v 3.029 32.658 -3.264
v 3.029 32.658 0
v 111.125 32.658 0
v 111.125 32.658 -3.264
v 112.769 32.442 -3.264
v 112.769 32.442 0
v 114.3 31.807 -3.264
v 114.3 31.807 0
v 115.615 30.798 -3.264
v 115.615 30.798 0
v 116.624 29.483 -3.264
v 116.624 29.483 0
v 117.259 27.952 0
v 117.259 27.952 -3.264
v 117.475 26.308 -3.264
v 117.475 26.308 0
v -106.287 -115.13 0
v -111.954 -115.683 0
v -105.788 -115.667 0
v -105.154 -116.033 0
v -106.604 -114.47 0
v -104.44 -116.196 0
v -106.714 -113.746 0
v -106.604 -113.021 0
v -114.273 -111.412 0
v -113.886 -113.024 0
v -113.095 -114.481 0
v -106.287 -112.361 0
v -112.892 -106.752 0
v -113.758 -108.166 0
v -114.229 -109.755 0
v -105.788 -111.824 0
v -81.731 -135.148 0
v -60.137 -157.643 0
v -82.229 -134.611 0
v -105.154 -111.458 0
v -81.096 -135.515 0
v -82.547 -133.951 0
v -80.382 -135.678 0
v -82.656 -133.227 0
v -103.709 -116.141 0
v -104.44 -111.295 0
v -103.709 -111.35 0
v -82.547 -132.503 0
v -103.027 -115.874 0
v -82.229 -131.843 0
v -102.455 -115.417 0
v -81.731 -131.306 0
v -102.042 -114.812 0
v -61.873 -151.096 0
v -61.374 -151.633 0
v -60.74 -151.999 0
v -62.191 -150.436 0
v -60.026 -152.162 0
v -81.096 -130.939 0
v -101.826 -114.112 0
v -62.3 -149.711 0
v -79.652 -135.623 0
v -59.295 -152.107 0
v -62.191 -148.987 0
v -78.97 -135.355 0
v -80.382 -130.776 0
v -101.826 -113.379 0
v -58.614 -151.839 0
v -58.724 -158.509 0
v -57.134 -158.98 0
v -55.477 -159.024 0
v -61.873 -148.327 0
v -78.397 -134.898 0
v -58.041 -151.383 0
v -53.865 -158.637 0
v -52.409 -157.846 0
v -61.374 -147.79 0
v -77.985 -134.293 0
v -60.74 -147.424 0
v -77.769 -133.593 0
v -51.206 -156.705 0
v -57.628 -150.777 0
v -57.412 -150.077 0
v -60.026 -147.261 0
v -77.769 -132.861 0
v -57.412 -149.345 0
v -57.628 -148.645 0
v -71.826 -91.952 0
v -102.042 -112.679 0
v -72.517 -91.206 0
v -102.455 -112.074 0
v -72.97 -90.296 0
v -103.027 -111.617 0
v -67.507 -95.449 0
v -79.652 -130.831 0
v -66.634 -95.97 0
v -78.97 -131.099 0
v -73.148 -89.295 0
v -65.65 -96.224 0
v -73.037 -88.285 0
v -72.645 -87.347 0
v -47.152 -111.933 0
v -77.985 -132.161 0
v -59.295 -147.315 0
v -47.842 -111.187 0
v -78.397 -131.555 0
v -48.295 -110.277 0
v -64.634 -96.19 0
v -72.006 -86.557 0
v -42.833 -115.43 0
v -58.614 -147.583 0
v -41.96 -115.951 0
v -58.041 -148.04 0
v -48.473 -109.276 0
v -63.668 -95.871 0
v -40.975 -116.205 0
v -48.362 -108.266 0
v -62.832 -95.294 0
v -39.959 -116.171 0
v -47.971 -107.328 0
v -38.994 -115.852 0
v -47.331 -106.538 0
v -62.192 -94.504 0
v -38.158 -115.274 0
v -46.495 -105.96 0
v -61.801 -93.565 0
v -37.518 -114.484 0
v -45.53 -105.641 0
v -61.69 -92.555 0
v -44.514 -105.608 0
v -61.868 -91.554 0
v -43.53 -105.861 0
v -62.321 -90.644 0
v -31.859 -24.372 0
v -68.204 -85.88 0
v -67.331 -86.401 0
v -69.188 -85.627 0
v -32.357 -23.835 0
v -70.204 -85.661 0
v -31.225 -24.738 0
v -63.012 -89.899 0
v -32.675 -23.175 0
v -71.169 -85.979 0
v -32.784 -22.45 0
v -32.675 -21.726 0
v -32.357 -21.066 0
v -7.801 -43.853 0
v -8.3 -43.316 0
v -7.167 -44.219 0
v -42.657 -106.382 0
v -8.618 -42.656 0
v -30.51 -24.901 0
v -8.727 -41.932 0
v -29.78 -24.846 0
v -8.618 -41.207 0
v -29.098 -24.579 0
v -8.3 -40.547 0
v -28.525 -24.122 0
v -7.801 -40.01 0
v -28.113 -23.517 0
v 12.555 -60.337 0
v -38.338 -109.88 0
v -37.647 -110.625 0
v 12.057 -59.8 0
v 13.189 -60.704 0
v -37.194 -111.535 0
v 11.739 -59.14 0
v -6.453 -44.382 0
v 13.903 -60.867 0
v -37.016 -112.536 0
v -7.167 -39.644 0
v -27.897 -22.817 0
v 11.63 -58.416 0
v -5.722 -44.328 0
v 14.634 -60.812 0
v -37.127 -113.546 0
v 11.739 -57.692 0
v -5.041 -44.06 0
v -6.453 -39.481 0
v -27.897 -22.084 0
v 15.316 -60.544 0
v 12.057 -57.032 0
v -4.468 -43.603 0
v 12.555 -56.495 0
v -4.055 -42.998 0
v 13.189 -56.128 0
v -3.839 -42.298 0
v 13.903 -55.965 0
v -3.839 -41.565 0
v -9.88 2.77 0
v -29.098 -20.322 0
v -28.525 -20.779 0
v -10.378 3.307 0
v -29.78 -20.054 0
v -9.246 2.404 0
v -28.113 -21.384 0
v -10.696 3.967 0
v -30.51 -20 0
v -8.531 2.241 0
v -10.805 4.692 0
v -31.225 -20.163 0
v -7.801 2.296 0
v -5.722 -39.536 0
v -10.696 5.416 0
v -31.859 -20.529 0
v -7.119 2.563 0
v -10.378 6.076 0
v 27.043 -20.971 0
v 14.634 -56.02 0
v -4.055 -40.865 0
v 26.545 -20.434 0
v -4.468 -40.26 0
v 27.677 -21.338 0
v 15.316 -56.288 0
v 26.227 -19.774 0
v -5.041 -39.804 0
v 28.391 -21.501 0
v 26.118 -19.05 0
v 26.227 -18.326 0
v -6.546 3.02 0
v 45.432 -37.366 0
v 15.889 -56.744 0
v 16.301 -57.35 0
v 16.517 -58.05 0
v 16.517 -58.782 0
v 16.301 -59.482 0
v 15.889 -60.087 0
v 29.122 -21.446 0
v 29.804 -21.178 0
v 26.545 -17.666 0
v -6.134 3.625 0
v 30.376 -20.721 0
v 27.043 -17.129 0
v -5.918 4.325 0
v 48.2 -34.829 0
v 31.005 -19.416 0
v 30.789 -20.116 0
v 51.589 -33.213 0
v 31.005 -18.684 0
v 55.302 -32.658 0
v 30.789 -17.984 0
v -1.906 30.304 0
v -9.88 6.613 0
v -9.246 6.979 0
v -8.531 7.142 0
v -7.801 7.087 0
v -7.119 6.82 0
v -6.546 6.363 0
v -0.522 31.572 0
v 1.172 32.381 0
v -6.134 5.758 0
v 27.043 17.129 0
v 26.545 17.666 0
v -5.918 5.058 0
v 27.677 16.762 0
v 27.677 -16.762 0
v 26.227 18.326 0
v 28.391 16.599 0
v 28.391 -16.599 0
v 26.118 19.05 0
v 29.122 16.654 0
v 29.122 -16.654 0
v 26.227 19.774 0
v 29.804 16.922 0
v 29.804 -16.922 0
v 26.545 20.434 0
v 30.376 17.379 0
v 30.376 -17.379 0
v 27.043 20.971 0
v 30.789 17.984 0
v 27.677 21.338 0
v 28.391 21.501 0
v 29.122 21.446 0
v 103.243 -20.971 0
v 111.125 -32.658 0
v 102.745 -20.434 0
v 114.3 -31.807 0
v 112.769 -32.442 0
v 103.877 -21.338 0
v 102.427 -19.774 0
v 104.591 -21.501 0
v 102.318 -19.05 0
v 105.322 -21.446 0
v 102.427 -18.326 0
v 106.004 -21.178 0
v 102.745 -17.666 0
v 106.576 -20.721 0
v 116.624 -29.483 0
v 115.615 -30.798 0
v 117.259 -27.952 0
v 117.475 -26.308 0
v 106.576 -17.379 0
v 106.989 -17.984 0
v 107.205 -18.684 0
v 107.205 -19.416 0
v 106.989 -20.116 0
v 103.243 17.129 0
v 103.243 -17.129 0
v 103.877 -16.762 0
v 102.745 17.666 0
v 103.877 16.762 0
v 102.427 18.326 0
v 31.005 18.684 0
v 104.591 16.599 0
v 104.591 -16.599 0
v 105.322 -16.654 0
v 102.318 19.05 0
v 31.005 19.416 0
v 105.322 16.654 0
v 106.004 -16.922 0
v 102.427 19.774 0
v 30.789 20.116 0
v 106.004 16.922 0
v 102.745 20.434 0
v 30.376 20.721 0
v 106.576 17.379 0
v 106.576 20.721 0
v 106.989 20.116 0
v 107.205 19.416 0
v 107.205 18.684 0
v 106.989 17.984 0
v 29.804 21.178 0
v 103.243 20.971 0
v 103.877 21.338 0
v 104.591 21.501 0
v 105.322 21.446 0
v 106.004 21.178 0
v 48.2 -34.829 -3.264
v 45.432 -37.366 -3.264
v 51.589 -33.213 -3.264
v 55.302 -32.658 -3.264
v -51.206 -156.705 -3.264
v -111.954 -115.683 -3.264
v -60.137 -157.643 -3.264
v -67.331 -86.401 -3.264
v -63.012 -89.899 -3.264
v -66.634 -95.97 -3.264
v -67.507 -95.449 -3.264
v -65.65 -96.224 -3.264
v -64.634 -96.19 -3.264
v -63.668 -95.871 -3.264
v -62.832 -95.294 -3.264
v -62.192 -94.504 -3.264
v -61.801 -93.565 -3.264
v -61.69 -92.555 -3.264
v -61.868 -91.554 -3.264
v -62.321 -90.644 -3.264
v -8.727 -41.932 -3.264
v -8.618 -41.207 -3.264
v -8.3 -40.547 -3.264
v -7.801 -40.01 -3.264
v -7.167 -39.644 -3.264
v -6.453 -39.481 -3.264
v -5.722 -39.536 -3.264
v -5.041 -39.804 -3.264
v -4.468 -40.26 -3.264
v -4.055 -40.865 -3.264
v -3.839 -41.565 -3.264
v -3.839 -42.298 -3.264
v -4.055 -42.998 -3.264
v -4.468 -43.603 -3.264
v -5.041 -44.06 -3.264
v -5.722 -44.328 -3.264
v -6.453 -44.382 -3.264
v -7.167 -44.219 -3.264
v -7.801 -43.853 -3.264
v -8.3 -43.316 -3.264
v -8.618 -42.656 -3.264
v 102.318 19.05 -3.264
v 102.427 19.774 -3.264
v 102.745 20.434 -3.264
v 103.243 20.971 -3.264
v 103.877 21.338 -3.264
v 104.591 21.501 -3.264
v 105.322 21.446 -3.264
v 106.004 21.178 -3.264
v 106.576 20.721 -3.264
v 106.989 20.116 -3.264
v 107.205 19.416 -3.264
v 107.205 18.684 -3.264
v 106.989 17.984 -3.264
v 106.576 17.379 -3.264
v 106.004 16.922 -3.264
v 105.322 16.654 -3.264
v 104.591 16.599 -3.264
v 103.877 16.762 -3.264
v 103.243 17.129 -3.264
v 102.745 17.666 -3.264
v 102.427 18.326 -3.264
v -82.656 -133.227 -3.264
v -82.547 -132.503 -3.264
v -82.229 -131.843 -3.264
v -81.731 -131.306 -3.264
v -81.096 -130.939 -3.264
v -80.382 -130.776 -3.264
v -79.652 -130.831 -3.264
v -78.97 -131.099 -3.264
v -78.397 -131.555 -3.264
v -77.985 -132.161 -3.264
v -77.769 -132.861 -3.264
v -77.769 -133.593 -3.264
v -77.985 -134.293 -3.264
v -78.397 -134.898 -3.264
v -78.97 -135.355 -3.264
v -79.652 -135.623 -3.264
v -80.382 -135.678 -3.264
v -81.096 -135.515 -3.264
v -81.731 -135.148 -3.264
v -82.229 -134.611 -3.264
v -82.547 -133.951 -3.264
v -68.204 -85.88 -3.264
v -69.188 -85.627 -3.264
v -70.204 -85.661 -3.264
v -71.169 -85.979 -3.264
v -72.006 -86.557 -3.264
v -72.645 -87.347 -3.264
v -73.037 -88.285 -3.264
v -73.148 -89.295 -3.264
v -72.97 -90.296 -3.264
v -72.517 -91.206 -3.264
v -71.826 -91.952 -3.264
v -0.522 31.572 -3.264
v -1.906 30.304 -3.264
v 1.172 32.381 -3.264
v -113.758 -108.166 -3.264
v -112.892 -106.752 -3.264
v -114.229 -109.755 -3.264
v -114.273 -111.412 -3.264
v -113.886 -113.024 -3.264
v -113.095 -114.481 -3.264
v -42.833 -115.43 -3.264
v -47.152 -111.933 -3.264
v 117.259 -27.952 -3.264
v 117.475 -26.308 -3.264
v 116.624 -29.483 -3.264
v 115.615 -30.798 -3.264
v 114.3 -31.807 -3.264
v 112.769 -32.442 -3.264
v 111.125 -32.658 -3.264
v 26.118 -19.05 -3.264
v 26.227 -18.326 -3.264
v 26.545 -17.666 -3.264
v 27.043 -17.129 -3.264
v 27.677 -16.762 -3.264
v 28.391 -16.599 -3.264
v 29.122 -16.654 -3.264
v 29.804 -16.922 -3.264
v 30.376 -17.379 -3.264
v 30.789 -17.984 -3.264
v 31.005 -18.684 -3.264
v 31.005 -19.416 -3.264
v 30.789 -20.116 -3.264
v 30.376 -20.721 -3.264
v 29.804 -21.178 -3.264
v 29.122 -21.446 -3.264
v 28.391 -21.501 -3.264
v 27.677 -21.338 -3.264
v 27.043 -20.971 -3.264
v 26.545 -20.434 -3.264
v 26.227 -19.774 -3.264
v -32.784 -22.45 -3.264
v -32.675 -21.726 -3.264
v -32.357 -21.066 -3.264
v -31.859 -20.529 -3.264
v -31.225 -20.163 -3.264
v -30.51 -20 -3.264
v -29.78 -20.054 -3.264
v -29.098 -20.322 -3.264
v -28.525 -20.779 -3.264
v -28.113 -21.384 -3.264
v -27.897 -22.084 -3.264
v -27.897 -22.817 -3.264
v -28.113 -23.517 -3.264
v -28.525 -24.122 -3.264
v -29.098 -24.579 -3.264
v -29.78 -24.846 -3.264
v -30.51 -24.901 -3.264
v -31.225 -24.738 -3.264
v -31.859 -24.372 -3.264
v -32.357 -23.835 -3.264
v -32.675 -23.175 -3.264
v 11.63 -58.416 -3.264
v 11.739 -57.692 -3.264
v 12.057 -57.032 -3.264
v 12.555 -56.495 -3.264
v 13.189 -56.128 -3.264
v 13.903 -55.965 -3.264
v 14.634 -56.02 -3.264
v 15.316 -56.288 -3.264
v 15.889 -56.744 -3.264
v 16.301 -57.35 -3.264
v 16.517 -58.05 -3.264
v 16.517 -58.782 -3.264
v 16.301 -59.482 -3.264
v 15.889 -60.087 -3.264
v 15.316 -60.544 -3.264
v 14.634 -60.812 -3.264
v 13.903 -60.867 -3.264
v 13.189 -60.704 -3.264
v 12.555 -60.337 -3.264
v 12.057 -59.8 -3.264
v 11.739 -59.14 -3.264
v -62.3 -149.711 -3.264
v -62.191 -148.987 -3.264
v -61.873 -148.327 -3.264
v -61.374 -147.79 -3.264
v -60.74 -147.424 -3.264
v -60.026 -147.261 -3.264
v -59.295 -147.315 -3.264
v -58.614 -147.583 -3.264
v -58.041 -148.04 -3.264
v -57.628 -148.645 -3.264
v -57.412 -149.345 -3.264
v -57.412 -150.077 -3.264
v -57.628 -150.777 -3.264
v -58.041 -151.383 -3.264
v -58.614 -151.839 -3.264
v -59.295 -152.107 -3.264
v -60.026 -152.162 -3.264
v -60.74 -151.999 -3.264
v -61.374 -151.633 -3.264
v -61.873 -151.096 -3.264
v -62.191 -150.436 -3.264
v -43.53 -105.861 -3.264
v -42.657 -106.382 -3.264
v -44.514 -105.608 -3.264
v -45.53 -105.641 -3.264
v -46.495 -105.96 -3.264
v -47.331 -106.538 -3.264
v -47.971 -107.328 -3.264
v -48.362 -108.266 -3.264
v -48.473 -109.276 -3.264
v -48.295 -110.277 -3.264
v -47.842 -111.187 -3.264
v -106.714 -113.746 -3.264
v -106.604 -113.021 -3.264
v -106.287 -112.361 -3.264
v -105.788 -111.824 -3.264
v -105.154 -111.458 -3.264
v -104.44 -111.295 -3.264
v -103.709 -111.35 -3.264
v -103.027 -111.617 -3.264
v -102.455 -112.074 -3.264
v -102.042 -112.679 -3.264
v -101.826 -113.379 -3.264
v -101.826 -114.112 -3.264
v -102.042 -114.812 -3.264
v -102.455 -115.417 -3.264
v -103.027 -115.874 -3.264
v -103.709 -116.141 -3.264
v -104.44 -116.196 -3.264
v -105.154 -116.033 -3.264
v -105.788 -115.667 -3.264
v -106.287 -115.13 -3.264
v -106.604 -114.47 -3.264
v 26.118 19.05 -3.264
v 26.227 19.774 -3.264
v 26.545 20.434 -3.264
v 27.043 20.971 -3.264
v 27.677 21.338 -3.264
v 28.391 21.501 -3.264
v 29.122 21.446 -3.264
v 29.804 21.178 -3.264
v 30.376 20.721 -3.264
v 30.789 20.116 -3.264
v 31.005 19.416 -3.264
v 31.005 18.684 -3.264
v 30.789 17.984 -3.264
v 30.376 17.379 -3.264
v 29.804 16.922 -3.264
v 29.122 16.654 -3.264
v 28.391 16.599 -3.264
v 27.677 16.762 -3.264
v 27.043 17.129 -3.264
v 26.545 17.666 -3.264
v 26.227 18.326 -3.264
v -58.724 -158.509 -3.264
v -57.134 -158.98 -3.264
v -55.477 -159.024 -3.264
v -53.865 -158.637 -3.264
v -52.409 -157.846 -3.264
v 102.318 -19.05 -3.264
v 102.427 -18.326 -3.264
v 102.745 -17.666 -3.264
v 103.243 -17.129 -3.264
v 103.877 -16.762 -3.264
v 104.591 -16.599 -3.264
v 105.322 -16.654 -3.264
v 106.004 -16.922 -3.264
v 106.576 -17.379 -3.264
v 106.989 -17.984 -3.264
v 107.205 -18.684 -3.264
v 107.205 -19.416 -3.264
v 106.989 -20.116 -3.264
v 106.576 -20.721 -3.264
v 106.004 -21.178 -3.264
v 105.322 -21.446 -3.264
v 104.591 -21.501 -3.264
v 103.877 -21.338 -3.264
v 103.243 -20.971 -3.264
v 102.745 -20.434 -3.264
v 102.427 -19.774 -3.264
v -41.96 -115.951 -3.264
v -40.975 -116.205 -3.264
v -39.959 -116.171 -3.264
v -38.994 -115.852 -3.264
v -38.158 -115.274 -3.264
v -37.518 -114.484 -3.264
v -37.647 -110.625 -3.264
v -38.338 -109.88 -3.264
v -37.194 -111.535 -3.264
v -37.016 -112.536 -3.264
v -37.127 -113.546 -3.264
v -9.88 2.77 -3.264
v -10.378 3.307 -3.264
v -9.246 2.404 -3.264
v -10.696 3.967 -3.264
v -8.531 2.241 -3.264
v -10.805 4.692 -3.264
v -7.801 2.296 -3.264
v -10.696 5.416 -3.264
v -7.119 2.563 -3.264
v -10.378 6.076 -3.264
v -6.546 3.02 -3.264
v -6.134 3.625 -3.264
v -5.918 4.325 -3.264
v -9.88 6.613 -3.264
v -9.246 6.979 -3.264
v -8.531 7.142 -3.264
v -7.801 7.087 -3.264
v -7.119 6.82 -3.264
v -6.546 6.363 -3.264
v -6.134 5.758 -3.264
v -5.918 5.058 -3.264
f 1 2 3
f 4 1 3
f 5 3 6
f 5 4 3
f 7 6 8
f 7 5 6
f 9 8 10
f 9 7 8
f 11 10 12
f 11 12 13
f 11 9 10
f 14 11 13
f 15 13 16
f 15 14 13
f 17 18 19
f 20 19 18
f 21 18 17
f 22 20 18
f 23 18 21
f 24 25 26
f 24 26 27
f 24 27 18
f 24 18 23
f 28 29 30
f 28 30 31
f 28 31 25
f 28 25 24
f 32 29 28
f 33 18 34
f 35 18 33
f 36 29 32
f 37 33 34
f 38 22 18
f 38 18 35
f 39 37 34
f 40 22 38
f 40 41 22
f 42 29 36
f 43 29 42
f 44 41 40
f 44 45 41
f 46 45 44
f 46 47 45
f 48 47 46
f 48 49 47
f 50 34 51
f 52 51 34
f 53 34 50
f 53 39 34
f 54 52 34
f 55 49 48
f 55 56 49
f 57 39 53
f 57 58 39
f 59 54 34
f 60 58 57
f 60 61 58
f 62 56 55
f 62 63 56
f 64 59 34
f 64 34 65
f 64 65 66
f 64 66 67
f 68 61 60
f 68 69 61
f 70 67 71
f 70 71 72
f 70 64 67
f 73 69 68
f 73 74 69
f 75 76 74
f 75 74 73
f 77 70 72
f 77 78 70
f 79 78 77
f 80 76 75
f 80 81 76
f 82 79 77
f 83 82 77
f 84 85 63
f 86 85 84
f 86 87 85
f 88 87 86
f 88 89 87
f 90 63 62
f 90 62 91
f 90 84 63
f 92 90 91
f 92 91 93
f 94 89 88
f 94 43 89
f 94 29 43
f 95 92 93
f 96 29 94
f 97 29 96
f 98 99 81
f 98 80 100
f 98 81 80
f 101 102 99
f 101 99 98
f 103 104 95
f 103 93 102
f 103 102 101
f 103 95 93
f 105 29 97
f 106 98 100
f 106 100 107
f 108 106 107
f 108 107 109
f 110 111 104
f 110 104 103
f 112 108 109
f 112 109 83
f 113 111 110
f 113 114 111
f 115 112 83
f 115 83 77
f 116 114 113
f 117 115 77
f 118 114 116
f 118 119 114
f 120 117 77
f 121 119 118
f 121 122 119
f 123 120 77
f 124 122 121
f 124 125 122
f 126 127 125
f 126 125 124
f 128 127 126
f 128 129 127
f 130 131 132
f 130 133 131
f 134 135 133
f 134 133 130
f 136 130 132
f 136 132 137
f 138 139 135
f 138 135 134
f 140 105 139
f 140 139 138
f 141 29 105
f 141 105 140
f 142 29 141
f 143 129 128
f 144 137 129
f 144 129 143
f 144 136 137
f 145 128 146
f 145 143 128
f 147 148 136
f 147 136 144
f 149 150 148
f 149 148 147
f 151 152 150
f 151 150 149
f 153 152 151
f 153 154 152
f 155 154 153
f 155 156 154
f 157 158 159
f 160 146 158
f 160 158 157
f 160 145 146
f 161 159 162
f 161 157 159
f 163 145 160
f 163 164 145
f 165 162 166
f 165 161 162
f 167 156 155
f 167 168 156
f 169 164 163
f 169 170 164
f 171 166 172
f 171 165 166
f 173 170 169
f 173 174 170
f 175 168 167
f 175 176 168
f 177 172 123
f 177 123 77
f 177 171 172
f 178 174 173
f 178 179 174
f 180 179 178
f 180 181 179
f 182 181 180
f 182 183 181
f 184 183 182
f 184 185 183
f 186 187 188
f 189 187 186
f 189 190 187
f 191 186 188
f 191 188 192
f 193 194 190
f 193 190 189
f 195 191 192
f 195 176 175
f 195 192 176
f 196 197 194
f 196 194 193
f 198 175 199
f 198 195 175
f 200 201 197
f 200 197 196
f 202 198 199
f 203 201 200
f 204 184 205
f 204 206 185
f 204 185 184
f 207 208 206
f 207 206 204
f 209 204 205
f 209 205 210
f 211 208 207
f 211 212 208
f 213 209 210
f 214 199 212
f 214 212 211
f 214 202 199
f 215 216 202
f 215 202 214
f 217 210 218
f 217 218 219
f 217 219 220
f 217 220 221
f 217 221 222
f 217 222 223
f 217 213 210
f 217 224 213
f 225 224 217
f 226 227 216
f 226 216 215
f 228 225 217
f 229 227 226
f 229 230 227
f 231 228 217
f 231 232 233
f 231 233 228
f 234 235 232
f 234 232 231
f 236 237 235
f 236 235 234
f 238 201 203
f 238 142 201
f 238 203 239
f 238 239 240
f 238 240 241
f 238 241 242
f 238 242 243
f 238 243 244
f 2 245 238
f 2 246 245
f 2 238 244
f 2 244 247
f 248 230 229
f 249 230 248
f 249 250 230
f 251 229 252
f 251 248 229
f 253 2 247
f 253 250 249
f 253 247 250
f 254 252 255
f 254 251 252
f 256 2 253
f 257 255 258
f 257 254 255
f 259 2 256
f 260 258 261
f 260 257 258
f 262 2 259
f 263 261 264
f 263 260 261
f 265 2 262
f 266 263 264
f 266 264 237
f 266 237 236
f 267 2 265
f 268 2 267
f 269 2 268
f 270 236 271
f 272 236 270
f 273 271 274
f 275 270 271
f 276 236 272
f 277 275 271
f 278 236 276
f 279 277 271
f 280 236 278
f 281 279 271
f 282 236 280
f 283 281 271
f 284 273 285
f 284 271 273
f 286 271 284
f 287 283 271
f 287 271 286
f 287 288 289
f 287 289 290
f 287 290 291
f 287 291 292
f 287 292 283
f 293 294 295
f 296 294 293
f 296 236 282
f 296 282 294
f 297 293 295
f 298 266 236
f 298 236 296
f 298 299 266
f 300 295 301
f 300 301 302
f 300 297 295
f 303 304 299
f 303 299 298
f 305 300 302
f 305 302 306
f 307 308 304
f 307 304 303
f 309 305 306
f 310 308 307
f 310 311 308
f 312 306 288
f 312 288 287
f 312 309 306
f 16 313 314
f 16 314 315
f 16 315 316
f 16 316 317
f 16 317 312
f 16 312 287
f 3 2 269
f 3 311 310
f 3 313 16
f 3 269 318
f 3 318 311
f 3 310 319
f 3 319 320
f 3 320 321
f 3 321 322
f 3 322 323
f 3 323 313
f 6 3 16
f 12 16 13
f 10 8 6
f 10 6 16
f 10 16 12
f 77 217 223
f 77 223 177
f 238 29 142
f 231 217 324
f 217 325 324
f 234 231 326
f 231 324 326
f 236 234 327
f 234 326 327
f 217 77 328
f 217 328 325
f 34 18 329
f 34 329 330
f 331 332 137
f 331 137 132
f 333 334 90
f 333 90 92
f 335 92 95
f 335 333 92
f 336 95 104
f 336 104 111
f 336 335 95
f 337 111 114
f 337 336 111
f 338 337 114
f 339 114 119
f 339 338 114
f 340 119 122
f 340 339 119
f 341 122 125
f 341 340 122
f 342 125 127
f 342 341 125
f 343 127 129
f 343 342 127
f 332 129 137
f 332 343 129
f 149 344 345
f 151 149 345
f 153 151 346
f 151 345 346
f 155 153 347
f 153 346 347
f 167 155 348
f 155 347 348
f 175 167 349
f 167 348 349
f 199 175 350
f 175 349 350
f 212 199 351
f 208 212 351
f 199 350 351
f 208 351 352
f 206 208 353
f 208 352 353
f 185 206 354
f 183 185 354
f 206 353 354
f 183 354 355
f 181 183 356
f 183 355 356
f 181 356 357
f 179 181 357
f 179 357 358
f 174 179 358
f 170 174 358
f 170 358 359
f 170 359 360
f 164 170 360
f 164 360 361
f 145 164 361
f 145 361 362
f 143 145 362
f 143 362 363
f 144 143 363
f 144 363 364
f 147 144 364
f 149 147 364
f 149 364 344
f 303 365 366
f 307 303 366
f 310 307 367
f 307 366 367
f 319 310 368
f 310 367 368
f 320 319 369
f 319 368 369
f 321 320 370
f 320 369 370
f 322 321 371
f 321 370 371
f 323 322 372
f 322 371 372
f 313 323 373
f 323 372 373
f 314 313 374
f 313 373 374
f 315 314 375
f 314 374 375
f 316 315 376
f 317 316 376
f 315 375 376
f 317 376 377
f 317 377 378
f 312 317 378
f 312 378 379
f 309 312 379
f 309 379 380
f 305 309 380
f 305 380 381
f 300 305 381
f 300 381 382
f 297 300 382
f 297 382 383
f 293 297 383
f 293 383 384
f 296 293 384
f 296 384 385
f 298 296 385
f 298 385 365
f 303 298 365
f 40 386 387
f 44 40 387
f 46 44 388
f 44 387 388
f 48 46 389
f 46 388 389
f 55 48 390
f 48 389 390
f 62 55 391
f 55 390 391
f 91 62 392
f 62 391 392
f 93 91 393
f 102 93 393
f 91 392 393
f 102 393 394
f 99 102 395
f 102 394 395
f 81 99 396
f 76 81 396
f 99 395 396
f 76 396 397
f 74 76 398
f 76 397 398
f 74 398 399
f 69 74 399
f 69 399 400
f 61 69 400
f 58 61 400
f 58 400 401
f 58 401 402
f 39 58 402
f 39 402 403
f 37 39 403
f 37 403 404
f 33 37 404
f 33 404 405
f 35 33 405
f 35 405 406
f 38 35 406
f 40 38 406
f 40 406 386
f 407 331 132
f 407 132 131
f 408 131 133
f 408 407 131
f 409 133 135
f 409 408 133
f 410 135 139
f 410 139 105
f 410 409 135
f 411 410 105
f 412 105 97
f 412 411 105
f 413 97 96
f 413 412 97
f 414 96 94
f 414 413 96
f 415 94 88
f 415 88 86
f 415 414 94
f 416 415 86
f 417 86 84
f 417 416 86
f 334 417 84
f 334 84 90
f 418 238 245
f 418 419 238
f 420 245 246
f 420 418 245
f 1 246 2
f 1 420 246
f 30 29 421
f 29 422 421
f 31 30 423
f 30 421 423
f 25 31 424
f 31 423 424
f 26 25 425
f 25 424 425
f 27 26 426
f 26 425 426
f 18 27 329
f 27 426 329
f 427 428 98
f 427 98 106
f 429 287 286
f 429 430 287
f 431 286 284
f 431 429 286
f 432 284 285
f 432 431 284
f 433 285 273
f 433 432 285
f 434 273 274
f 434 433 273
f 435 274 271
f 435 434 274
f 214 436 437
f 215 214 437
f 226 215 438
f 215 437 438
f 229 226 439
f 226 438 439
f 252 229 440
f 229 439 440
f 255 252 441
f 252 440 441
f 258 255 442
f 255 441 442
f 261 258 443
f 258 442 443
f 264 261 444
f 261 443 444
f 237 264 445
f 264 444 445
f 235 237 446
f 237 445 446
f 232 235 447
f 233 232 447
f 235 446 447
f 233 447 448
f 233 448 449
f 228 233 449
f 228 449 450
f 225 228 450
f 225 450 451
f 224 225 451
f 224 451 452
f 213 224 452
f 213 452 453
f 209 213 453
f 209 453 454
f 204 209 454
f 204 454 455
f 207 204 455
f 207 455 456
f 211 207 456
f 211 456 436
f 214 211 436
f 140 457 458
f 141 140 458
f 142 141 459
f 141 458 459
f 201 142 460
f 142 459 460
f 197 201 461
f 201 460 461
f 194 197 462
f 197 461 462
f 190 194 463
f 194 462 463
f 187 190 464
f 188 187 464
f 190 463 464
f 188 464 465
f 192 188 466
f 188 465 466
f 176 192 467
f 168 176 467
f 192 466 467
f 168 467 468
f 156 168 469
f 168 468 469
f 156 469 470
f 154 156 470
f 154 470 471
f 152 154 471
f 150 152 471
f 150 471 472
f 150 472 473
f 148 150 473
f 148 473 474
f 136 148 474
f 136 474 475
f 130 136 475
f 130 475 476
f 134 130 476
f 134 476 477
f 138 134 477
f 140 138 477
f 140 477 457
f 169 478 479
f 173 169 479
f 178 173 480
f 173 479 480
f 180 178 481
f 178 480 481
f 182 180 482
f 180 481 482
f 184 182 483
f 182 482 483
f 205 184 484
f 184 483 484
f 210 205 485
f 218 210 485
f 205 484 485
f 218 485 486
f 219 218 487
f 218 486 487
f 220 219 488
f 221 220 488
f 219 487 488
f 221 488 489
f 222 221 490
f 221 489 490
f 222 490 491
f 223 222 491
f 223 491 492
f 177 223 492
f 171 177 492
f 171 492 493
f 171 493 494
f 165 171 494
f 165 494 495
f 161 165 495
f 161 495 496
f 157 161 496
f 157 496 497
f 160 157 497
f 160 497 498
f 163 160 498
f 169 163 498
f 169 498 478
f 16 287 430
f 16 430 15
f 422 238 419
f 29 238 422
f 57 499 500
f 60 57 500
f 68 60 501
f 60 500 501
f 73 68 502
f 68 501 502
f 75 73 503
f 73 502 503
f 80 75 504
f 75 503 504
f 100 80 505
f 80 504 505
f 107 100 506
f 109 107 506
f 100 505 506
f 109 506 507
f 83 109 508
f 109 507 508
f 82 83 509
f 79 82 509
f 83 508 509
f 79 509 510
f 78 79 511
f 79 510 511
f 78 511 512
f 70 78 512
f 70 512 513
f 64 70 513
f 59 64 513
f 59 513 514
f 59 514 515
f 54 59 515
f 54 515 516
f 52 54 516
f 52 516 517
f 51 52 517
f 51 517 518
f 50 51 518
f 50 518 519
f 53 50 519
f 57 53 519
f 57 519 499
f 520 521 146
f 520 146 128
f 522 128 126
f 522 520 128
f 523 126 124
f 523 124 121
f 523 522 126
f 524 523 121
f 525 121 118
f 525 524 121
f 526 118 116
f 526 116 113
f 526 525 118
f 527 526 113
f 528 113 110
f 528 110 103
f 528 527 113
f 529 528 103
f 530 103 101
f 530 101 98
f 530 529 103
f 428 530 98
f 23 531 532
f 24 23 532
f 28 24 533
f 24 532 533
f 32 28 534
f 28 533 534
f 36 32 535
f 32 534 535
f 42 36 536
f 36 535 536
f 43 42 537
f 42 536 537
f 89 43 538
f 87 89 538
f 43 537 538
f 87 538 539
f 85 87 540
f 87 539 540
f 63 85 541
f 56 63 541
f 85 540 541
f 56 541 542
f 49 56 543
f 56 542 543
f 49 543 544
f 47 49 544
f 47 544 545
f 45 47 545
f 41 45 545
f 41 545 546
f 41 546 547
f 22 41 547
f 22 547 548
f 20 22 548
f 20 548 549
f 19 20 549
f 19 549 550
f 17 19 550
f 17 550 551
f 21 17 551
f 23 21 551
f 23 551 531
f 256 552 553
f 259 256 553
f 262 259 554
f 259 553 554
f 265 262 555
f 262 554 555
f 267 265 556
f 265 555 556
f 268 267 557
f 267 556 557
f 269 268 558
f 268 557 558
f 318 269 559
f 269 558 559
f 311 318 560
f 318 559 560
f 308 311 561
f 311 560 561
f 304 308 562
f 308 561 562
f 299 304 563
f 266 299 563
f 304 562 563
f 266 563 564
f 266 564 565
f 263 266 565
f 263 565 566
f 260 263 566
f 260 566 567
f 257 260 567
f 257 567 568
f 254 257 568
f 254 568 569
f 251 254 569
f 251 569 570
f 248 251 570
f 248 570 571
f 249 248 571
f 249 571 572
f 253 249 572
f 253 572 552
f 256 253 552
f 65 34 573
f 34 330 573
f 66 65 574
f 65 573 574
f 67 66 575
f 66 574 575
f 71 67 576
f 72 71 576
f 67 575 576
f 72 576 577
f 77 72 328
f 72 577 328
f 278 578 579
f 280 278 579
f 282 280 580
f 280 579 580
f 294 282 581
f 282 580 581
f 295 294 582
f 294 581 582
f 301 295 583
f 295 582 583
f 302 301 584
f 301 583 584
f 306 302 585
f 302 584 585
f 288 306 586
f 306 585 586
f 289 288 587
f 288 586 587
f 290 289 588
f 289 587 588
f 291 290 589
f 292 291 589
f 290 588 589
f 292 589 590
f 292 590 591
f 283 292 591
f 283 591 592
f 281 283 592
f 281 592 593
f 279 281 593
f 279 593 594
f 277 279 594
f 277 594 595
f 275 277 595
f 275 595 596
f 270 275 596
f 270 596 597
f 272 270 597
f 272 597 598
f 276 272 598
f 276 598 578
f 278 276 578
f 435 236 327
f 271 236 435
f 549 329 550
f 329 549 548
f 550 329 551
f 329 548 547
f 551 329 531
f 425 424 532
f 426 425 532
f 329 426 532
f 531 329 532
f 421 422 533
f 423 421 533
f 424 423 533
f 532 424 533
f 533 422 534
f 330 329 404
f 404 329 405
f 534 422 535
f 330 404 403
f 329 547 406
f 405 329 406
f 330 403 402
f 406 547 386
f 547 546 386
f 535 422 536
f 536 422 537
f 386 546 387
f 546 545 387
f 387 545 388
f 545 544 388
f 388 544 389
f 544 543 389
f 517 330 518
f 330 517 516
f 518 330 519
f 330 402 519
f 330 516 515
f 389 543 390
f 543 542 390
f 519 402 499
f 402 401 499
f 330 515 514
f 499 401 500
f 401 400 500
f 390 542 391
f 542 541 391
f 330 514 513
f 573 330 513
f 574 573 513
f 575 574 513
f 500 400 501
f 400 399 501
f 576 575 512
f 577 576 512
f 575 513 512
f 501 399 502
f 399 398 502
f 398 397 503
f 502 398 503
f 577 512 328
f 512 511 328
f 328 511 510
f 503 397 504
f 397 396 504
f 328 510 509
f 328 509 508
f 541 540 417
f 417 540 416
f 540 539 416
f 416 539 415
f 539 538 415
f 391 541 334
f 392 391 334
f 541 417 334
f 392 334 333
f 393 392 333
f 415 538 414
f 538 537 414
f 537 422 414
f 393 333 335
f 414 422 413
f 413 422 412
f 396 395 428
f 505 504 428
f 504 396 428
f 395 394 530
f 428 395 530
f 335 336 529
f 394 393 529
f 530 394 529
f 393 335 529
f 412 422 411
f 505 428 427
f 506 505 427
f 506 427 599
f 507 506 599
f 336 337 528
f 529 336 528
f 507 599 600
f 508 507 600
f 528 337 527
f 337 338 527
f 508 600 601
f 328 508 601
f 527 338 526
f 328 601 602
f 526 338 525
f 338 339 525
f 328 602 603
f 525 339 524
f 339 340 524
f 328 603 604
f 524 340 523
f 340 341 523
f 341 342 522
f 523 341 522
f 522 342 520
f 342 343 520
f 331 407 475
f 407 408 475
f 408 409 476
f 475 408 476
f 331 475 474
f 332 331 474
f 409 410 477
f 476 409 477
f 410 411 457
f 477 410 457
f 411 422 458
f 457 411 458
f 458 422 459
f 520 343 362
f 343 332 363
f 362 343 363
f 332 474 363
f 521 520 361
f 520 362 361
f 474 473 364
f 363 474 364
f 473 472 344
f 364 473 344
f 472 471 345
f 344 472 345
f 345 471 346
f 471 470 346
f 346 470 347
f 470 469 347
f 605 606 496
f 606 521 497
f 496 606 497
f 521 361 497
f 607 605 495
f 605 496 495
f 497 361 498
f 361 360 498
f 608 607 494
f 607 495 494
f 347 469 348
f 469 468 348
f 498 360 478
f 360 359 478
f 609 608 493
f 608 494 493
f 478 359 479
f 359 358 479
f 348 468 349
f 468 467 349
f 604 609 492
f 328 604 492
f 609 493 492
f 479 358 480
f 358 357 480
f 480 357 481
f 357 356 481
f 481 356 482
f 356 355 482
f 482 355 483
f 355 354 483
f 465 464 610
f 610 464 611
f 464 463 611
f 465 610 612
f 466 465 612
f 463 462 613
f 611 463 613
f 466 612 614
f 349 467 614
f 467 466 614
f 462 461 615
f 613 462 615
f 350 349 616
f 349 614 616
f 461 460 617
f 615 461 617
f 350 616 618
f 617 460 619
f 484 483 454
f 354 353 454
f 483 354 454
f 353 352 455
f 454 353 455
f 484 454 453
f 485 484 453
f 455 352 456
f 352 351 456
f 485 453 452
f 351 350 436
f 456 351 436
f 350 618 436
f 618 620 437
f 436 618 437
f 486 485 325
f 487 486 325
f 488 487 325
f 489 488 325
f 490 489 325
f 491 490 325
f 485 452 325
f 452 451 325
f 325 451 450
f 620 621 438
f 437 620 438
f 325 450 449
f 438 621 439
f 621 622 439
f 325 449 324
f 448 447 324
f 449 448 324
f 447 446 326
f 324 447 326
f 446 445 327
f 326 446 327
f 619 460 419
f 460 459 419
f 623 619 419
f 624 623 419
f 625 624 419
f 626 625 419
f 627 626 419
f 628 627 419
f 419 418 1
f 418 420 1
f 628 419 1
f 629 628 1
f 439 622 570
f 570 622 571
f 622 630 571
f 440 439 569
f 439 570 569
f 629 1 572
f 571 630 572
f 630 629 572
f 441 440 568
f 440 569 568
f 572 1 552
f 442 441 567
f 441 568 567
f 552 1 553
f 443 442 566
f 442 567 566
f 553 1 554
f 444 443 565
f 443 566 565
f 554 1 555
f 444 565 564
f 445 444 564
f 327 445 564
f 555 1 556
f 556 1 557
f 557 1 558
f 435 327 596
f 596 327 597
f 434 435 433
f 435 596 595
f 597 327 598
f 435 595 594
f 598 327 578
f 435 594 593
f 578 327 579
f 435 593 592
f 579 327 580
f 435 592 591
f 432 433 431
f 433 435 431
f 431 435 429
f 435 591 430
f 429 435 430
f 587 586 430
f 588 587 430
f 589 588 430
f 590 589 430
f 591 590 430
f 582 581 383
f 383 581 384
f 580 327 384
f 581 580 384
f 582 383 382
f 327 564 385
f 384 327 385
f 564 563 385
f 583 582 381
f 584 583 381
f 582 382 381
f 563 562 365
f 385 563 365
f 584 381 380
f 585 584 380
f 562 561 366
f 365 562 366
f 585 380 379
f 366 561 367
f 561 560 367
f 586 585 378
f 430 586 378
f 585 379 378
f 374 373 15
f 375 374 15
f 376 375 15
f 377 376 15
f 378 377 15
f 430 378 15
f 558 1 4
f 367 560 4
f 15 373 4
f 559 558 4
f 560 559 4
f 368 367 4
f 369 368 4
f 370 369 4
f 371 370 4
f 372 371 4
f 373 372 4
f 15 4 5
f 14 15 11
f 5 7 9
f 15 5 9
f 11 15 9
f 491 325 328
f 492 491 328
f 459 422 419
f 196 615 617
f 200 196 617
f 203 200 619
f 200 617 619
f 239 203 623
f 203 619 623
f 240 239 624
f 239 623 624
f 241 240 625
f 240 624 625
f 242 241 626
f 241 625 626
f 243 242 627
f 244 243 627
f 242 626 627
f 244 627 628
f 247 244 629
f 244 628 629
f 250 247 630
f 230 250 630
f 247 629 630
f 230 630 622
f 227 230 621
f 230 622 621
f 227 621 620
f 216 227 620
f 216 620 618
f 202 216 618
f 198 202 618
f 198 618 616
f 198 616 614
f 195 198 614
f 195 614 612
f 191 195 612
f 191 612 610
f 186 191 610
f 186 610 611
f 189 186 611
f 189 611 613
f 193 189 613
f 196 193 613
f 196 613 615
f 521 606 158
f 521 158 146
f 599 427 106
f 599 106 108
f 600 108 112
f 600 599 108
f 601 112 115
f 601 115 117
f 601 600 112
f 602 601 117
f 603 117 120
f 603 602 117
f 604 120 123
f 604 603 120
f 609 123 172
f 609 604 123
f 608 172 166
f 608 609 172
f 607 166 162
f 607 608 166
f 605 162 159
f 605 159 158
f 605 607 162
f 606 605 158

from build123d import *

# Parameters (mm, degrees)
SKETCH1_W                    = 117.475
SKETCH1_H                    = 65.3161
BASE_FLANGE1_DEPTH           = 3.2639
F_10_0_1935_DIAMETER_HOLE1_D = 4.9149
BOSS_EXTRUDE1_DEPTH          = 3.2639
F_1_4_START                  = -3.2639
F_1_4_CLEARANCE_SLOT1_DEPTH  = 3.2639
F_10_0_1935_DIAMETER_HOLE2_D = 4.9149
FILLET1_R                    = 6.35
FILLET2_R                    = 12.7


# Read off the part's stored shape, not the designer's step: 1/4 Clearance Slot1
# Sheet-metal steps are written as plain solids
with BuildPart() as part:
    # Sketch1 → Base-Flange1 (new body)
    with BuildSketch(Plane.XY):
        with Locations((58.7375, 0)):
            Rectangle(SKETCH1_W, SKETCH1_H)
    extrude(amount=-BASE_FLANGE1_DEPTH)

    # #10 (0.1935) Diameter Hole1 (through all)
    with Locations(Plane.XY):
        with Locations((28.575, 19.05), (28.575, -19.05), (104.775, 19.05), (104.775, -19.05)):
            Hole(F_10_0_1935_DIAMETER_HOLE1_D / 2)

    # Sketch8 → Boss-Extrude1 (add)
    with BuildSketch(Plane.XY):
        Polygon((0, 32.65805), (-116.888396133, -111.687098016), (-55.202435442, -161.639404056), (49.244605652, -32.65805), (0, -32.65805), align=None)
    extrude(amount=-BOSS_EXTRUDE1_DEPTH)

    # 1/4 Clearance Slot1 outline → 1/4 Clearance Slot1 (cut)
    with BuildSketch(Plane.XY.offset(F_1_4_START)):
        with BuildLine():
            Line((-71.825899608, -91.951886399), (-67.506895384, -95.449347058))
            ThreePointArc((-67.506895384, -95.449347058), (-62.484066487, -94.921426468), (-63.011987077, -89.898597571))
            Line((-63.011987077, -89.898597571), (-67.330991301, -86.401136912))
            ThreePointArc((-67.330991301, -86.401136912), (-72.353820198, -86.929057502), (-71.825899608, -91.951886399))
        make_face()
        with BuildLine():
            ThreePointArc((-42.832511108, -115.430269474), (-37.809682211, -114.902348884), (-38.337602801, -109.879519987))
            Line((-38.337602801, -109.879519987), (-42.656607025, -106.382059328))
            ThreePointArc((-42.656607025, -106.382059328), (-47.679435921, -106.909979918), (-47.151515331, -111.932808814))
            Line((-47.151515331, -111.932808814), (-42.832511108, -115.430269474))
        make_face()
    extrude(amount=F_1_4_CLEARANCE_SLOT1_DEPTH, mode=Mode.SUBTRACT)

    # #10 (0.1935) Diameter Hole2 (through all)
    with Locations(Plane.XY):
        with Locations((-30.326764214, -22.450322184), (-104.256177153, -113.745544006), (14.087127483, -58.415982533), (-59.842285455, -149.711204355), (-6.269239545, -41.93172154), (-80.198652483, -133.226943362), (-8.347749557, 4.69150052)):
            Hole(F_10_0_1935_DIAMETER_HOLE2_D / 2)

    # Fillet1
    fillet1_edges = [part.edges().sort_by_distance(p)[0] for p in [
        (-116.888396133, -111.687098016, -1.63195),
        (-55.202435442, -161.639404056, -1.63195),
        (0, 32.65805, -1.63195),
        (117.475, 32.65805, -1.63195),
        (117.475, -32.65805, -1.63195),
    ]]
    fillet(fillet1_edges, radius=FILLET1_R)

    # Fillet2
    fillet2_edges = [part.edges().sort_by_distance(p)[0] for p in [
        (49.244605652, -32.65805, -1.63195),
    ]]
    fillet(fillet2_edges, radius=FILLET2_R)


solid = part.part
